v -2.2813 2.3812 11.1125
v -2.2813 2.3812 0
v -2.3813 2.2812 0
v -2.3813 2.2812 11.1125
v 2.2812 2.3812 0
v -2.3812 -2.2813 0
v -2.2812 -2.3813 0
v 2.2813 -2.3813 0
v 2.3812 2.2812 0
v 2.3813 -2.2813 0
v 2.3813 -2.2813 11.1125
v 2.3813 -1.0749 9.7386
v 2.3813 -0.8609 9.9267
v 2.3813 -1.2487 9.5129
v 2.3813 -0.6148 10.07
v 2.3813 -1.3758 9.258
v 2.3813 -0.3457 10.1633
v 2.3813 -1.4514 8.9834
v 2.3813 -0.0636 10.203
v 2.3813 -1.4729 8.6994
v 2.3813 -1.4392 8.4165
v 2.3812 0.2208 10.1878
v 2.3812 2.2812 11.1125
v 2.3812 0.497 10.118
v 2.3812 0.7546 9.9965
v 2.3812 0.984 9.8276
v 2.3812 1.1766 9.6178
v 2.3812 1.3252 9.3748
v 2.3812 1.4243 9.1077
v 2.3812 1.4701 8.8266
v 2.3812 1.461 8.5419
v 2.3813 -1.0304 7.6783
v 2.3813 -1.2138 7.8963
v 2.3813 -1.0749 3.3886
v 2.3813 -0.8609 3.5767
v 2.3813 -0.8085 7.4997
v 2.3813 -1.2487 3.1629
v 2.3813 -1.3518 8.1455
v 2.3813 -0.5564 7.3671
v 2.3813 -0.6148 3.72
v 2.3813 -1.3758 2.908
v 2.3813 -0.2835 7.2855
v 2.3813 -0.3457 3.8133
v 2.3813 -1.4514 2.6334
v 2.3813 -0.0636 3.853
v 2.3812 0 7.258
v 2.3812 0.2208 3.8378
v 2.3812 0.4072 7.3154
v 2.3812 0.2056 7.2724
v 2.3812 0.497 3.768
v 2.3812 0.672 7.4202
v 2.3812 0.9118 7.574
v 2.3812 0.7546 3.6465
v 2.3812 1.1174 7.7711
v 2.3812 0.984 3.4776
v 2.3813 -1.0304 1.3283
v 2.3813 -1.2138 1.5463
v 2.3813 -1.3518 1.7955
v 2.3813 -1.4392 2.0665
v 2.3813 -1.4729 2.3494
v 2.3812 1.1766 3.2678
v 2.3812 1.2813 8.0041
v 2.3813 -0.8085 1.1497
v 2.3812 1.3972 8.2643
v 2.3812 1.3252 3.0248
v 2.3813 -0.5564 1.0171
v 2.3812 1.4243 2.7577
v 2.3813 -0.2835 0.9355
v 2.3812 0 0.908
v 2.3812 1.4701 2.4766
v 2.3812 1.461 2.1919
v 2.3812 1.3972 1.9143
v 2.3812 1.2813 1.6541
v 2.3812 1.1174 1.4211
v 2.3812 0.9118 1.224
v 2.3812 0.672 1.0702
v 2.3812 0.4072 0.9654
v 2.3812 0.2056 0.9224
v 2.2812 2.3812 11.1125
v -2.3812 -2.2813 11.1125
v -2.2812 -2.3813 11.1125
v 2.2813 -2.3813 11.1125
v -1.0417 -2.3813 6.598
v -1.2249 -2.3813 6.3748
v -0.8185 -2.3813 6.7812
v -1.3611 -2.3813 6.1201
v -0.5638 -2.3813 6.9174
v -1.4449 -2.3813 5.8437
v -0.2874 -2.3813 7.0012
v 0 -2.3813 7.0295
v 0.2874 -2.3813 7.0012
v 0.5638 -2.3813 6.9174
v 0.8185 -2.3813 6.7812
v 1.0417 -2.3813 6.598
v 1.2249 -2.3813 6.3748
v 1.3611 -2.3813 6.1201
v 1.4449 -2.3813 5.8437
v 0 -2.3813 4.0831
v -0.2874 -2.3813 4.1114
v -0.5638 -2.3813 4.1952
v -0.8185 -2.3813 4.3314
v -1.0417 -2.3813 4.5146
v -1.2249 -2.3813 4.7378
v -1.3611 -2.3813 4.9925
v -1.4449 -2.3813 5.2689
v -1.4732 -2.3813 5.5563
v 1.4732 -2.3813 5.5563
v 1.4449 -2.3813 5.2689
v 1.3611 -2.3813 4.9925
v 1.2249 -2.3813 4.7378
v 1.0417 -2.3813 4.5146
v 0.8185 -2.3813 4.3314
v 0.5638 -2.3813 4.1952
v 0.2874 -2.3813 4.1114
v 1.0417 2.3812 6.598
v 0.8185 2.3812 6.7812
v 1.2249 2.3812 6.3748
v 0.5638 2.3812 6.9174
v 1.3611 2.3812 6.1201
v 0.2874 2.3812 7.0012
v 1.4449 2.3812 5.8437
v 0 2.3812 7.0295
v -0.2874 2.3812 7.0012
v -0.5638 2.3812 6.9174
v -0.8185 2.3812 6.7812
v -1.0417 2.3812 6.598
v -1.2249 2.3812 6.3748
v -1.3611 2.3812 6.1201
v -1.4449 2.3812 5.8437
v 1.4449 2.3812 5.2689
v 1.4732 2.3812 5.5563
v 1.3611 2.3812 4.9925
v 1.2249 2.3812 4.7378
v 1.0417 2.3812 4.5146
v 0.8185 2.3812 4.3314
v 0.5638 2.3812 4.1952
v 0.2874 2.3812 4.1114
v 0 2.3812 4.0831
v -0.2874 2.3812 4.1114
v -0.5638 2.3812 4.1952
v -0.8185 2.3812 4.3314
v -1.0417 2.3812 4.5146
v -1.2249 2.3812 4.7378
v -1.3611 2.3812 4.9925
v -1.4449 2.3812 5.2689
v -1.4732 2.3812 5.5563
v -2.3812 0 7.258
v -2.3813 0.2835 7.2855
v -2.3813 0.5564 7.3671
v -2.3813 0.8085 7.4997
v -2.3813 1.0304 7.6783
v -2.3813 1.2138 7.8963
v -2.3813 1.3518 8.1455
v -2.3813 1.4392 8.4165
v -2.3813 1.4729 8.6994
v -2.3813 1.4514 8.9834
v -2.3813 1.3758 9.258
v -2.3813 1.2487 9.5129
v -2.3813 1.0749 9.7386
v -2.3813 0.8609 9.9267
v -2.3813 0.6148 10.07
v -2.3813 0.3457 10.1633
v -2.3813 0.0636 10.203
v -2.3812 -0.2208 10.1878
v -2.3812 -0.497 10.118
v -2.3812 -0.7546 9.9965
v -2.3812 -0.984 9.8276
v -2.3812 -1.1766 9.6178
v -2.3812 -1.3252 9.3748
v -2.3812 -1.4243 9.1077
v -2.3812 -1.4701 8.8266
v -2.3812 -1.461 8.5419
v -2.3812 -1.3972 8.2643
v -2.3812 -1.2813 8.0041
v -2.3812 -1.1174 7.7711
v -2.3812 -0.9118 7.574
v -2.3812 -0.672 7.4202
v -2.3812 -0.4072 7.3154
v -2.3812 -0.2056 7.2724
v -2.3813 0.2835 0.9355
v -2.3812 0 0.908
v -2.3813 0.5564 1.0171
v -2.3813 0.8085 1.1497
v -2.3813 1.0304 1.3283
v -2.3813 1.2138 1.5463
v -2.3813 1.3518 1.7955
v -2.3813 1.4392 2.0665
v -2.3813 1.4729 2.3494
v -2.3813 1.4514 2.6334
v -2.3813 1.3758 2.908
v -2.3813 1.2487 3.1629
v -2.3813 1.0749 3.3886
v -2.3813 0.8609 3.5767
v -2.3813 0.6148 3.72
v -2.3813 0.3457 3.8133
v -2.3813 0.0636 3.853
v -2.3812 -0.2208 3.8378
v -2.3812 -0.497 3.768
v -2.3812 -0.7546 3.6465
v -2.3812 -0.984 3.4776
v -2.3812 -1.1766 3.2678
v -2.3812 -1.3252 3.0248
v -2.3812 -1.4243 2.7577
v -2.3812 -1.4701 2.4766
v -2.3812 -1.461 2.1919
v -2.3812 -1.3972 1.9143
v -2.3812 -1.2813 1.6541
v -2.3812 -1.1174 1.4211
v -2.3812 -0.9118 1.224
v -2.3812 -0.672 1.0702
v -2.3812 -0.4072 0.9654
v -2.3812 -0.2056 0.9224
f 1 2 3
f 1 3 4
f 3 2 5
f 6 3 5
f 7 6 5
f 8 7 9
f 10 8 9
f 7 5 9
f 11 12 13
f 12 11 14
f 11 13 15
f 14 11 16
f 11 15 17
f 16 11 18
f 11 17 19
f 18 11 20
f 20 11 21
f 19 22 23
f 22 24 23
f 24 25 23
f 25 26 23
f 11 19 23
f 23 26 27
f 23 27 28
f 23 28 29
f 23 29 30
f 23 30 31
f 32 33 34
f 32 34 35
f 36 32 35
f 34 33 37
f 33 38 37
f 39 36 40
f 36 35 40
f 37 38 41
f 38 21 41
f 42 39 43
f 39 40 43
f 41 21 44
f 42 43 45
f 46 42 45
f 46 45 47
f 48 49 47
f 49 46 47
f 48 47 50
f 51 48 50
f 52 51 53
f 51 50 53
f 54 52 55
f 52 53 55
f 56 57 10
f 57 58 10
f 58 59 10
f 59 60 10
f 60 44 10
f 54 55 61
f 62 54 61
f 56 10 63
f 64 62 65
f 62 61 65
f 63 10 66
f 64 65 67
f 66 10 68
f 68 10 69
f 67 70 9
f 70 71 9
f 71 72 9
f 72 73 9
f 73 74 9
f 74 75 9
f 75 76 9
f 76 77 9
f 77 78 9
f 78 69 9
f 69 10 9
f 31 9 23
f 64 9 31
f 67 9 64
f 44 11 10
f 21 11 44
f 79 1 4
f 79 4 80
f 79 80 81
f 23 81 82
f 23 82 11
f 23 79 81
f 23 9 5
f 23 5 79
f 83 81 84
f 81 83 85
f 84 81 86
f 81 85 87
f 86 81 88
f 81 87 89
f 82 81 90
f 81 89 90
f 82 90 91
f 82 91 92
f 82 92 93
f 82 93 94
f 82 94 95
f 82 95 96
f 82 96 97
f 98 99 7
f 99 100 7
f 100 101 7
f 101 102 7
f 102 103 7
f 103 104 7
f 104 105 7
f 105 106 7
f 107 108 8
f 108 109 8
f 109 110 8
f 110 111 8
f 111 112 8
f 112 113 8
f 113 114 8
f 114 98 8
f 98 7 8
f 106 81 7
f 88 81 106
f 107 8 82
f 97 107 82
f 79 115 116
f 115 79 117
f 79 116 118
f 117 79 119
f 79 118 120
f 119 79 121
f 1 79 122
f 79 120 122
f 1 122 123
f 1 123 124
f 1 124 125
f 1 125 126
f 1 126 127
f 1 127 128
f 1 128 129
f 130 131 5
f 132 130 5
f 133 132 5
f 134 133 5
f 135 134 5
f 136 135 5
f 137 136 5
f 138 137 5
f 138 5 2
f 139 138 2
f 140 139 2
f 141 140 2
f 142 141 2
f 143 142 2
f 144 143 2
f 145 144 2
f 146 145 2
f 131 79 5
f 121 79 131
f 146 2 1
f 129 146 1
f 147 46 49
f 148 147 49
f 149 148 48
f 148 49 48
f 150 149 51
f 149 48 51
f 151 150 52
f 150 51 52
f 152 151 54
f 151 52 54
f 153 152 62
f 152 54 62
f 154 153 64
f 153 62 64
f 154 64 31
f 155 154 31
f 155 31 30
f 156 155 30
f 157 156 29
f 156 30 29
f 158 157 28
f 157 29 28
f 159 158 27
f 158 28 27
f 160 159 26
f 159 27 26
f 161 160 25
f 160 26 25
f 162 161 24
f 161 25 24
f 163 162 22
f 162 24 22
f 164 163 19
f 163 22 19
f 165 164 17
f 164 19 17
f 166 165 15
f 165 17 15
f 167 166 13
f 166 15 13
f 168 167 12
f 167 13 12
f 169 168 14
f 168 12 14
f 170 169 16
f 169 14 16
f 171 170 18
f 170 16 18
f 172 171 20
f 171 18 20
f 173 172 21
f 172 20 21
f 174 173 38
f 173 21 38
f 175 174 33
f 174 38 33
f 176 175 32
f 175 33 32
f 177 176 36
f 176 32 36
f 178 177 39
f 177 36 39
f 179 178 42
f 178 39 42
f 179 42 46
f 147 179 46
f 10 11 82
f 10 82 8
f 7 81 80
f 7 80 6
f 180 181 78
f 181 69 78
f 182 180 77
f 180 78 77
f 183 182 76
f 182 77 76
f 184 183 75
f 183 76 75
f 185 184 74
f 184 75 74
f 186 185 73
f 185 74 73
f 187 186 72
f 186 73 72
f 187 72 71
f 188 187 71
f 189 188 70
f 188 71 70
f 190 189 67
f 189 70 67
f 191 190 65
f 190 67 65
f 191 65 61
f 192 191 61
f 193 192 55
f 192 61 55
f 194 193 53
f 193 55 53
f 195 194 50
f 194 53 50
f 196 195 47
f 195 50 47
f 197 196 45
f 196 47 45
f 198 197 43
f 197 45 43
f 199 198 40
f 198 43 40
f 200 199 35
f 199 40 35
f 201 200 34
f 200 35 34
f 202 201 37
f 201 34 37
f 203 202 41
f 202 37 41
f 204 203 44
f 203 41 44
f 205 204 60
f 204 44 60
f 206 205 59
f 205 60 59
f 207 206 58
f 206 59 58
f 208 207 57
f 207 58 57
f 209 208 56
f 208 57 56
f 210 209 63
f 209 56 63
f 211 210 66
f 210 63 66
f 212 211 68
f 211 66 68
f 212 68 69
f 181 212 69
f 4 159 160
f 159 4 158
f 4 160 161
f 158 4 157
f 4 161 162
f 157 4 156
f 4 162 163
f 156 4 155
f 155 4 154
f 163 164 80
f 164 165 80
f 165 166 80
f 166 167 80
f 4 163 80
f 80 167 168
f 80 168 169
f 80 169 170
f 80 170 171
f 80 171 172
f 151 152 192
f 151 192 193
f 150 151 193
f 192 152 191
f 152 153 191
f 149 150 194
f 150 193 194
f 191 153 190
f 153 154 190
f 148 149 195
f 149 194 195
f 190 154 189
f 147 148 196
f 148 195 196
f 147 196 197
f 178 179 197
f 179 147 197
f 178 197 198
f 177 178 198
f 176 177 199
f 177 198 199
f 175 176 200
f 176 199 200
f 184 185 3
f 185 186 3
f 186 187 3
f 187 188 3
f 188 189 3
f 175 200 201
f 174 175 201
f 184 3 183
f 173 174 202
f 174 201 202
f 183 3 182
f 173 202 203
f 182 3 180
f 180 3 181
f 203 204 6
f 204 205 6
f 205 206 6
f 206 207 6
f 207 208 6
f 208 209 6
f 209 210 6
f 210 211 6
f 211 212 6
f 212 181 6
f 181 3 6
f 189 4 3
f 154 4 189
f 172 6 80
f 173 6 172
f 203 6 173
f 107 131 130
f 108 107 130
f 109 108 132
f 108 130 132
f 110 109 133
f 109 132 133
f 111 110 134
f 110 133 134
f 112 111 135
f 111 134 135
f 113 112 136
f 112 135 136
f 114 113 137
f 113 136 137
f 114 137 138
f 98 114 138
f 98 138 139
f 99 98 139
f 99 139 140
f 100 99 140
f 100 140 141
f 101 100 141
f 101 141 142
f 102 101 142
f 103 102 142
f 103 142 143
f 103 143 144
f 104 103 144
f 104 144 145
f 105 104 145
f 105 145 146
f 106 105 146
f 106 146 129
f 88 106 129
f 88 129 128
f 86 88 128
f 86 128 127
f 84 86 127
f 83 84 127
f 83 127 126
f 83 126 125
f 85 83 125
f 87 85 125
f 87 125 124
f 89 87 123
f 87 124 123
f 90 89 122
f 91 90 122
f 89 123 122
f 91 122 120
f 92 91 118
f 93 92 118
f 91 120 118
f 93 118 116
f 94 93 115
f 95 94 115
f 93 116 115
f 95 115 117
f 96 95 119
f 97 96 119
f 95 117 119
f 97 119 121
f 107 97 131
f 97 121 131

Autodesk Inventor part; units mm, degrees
ref_plane "YZ Plane" through (0, 0, 0) normal (1, 0, 0) x (0, 1, 0)
ref_plane "XZ Plane" through (0, 0, 0) normal (0, 1, 0) x (-1, 0, 0)
ref_plane "XY Plane" through (0, 0, 0) normal (0, 0, 1) x (1, 0, 0)
sketch "Sketch1" plane through (0, 0, 0) normal (0, 0, 1) x (1, 0, 0)
  line L0 (-2.3812, -2.3813) -> (2.3813, -2.3813)
  line L1 (2.3813, -2.3813) -> (2.3812, 2.3812)
  line L2 (2.3812, 2.3812) -> (-2.3813, 2.3812)
  line L3 (-2.3813, 2.3812) -> (-2.3812, -2.3813)
  line L4 (-2.3812, -2.3813) -> (2.3812, 2.3812) construction
  line L5 (2.3813, -2.3813) -> (-2.3813, 2.3812) construction
  point P0 (0, 0)
  dimension "d0" = 4.7625
  dimension "d1" = 4.7625
extrude "Extrusion1" add sketch "Sketch1" along normal blind 11.1125
sketch "Sketch2" plane through (-2.3813, 2.3812, 0) normal (0, 1, 0) x (1, 0, 0)
  line L0 (2.3813, 0) -> (2.3813, -11.1125) construction
  line L1 (4.7625, -11.1125) -> (0, -11.1125) projected
  circle A0 centre (2.3813, -5.5563) radius 1.4732
  circle A1 centre (2.3813, -11.9062) radius 1.4732
  circle A2 centre (2.3813, -18.2563) radius 1.4732
  circle A3 centre (2.3813, -24.6063) radius 1.4732
  circle A4 centre (2.3813, -29.3688) radius 1.4493 construction
  line L2 (4.7625, 0) -> (0, 0) projected
  dimension "d4" = 2.9464
  dimension "d7" = 6.35
  dimension "d12" = 4.7625
  dimension "d13" = 5.5563
extrude "Extrusion2" cut sketch "Sketch2" against normal through all contours A0 | A2 | A3
sketch "Sketch3" plane through (2.3813, -2.3813, 0) normal (1, 0, 0) x (0, 0, -1)
  line L0 (0, 2.3813) -> (-11.1125, 2.3813) construction
  line L1 (-11.1125, 0) -> (-11.1125, 4.7625) projected
  circle A0 centre (-8.7312, 2.3813) radius 1.4732
  circle A1 centre (-2.3812, 2.3813) radius 1.4732
  circle A2 centre (3.9688, 2.3813) radius 1.4732
  circle A3 centre (10.3188, 2.3813) radius 1.4732
  dimension "d16" = 2.9464
  dimension "d17" = 2.3813
  dimension "d20" = 6.35
extrude "Extrusion3" cut sketch "Sketch3" against normal through all
chamfer "Chamfer1" distance 0.1 angle 45 4 edges at (-2.3813, 2.3812, 5.5563) (2.3812, 2.3812, 5.5563) (2.3813, -2.3813, 5.5563) (-2.3812, -2.3813, 5.5563)
equation "\"d1\" = d0"
properties part number "Nut Strip" material "Aluminum 6061"
